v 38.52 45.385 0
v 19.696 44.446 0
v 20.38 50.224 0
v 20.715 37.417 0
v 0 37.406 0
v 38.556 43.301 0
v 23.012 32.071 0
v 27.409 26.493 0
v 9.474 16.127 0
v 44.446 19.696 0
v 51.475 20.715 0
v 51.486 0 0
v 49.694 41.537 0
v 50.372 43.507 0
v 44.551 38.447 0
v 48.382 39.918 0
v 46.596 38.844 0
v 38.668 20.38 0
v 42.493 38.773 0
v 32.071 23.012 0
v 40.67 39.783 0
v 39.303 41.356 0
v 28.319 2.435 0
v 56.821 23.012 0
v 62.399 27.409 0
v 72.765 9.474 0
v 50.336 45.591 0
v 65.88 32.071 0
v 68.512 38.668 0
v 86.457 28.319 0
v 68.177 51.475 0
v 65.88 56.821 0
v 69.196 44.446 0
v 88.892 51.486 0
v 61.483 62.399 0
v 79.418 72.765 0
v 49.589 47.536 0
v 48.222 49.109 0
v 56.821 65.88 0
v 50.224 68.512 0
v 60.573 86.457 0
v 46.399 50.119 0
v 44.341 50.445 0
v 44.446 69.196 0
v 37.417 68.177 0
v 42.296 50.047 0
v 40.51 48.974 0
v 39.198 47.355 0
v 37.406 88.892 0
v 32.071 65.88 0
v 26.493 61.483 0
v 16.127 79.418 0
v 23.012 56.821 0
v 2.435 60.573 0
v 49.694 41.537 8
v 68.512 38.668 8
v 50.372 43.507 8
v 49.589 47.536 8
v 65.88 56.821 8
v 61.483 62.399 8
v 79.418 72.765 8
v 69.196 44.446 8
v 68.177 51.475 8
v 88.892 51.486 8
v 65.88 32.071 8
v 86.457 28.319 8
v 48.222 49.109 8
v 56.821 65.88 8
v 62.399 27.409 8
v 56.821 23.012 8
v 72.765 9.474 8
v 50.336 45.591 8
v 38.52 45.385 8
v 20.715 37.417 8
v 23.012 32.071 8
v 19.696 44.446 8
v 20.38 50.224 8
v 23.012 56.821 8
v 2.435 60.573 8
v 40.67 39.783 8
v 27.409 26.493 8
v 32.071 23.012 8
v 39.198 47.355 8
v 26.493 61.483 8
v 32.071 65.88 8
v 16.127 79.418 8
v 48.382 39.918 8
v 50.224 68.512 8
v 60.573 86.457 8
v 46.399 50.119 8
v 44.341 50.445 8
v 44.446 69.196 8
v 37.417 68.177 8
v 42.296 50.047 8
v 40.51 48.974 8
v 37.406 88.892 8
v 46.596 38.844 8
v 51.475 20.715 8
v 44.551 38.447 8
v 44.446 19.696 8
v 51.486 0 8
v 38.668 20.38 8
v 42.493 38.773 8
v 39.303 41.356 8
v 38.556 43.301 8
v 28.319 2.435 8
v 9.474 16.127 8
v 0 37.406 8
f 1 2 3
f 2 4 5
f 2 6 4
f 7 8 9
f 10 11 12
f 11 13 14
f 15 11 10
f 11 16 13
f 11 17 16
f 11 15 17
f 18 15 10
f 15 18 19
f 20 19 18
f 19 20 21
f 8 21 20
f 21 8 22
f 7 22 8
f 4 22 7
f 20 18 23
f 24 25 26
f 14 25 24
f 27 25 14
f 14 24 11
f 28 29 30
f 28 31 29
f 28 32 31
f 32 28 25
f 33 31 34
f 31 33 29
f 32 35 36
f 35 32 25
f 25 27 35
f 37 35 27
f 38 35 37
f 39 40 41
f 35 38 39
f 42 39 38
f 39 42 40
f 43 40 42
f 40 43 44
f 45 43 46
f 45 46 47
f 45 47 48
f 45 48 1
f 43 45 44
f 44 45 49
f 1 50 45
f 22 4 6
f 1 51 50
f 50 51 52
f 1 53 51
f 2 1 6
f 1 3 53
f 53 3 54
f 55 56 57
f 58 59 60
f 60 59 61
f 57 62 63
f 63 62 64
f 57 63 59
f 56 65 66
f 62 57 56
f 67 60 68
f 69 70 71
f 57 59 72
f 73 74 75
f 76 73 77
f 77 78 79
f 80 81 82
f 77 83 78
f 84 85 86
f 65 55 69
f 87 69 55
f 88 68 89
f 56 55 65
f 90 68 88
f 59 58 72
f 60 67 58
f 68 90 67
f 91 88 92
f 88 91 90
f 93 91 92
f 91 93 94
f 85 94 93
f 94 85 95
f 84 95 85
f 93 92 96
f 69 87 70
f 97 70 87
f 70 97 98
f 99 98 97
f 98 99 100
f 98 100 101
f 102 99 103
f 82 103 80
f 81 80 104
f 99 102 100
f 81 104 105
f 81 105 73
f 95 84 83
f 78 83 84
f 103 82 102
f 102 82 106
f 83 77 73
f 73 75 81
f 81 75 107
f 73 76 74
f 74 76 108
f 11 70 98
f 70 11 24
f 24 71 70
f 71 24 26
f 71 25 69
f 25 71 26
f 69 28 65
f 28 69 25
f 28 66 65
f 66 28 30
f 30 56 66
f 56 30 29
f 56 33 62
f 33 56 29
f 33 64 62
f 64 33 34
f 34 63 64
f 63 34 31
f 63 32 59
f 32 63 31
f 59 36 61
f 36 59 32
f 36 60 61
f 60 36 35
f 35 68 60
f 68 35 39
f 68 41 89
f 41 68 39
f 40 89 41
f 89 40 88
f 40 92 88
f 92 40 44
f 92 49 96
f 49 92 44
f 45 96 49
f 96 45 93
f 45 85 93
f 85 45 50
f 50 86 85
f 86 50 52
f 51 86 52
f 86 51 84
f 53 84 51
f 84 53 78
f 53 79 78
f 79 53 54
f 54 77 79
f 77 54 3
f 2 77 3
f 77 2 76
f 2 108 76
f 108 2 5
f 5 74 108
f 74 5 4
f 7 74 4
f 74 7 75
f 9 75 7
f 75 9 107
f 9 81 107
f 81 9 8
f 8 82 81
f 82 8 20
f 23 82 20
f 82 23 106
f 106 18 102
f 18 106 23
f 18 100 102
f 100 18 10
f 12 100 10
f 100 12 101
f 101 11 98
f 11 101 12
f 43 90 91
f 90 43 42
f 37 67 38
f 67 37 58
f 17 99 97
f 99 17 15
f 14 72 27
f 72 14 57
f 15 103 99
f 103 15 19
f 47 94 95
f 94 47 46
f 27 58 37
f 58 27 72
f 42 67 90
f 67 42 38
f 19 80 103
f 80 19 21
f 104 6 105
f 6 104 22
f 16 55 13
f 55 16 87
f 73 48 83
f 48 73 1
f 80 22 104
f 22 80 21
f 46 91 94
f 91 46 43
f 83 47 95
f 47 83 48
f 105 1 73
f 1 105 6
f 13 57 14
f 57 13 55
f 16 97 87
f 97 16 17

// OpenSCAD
$fn = 32;

// ----------------------------------------------------------------------
// Star wheel: 12-point ratchet, R45
// ----------------------------------------------------------------------

// --- parameters (mm) ---
n_points = 12;            // number of points / teeth
r_out = 45;               // tip radius
r_in = 24.75;             // root radius
bore_r = 6;               // centre bore radius
plate_t = 8;              // plate thickness, Z (extrusion height)
bore_d = 12;              // centre bore diameter

profile = [[44.446, 69.196], [37.406, 88.892], [37.417, 68.177], [32.071, 65.88], [16.127, 79.418], [26.493, 61.483], [23.012, 56.821], [2.435, 60.573], [20.38, 50.224], [19.696, 44.446], [0, 37.406], [20.715, 37.417], [23.012, 32.071], [9.474, 16.127], [27.409, 26.493], [32.071, 23.012], [28.319, 2.435], [38.668, 20.38], [44.446, 19.696], [51.486, 0], [51.475, 20.715], [56.821, 23.012], [72.765, 9.474], [62.399, 27.409], [65.88, 32.071], [86.457, 28.319], [68.512, 38.668], [69.196, 44.446], [88.892, 51.486], [68.177, 51.475], [65.88, 56.821], [79.418, 72.765], [61.483, 62.399], [56.821, 65.88], [60.573, 86.457], [50.224, 68.512]];  // primary outline, 36 points, counter clockwise
void_1 = [[50.336, 45.591], [49.589, 47.536], [48.222, 49.109], [46.399, 50.119], [44.341, 50.445], [42.296, 50.047], [40.51, 48.974], [39.198, 47.355], [38.52, 45.385], [38.556, 43.301], [39.303, 41.356], [40.67, 39.783], [42.493, 38.773], [44.551, 38.447], [46.596, 38.844], [48.382, 39.918], [49.694, 41.537], [50.372, 43.507]];  // centre bore, 18 points

// --- the one profile operation ---
difference() {
  linear_extrude(height = plate_t) polygon(points = profile);
  translate([0, 0, -1])
    linear_extrude(height = plate_t + 2) polygon(points = void_1);
}
